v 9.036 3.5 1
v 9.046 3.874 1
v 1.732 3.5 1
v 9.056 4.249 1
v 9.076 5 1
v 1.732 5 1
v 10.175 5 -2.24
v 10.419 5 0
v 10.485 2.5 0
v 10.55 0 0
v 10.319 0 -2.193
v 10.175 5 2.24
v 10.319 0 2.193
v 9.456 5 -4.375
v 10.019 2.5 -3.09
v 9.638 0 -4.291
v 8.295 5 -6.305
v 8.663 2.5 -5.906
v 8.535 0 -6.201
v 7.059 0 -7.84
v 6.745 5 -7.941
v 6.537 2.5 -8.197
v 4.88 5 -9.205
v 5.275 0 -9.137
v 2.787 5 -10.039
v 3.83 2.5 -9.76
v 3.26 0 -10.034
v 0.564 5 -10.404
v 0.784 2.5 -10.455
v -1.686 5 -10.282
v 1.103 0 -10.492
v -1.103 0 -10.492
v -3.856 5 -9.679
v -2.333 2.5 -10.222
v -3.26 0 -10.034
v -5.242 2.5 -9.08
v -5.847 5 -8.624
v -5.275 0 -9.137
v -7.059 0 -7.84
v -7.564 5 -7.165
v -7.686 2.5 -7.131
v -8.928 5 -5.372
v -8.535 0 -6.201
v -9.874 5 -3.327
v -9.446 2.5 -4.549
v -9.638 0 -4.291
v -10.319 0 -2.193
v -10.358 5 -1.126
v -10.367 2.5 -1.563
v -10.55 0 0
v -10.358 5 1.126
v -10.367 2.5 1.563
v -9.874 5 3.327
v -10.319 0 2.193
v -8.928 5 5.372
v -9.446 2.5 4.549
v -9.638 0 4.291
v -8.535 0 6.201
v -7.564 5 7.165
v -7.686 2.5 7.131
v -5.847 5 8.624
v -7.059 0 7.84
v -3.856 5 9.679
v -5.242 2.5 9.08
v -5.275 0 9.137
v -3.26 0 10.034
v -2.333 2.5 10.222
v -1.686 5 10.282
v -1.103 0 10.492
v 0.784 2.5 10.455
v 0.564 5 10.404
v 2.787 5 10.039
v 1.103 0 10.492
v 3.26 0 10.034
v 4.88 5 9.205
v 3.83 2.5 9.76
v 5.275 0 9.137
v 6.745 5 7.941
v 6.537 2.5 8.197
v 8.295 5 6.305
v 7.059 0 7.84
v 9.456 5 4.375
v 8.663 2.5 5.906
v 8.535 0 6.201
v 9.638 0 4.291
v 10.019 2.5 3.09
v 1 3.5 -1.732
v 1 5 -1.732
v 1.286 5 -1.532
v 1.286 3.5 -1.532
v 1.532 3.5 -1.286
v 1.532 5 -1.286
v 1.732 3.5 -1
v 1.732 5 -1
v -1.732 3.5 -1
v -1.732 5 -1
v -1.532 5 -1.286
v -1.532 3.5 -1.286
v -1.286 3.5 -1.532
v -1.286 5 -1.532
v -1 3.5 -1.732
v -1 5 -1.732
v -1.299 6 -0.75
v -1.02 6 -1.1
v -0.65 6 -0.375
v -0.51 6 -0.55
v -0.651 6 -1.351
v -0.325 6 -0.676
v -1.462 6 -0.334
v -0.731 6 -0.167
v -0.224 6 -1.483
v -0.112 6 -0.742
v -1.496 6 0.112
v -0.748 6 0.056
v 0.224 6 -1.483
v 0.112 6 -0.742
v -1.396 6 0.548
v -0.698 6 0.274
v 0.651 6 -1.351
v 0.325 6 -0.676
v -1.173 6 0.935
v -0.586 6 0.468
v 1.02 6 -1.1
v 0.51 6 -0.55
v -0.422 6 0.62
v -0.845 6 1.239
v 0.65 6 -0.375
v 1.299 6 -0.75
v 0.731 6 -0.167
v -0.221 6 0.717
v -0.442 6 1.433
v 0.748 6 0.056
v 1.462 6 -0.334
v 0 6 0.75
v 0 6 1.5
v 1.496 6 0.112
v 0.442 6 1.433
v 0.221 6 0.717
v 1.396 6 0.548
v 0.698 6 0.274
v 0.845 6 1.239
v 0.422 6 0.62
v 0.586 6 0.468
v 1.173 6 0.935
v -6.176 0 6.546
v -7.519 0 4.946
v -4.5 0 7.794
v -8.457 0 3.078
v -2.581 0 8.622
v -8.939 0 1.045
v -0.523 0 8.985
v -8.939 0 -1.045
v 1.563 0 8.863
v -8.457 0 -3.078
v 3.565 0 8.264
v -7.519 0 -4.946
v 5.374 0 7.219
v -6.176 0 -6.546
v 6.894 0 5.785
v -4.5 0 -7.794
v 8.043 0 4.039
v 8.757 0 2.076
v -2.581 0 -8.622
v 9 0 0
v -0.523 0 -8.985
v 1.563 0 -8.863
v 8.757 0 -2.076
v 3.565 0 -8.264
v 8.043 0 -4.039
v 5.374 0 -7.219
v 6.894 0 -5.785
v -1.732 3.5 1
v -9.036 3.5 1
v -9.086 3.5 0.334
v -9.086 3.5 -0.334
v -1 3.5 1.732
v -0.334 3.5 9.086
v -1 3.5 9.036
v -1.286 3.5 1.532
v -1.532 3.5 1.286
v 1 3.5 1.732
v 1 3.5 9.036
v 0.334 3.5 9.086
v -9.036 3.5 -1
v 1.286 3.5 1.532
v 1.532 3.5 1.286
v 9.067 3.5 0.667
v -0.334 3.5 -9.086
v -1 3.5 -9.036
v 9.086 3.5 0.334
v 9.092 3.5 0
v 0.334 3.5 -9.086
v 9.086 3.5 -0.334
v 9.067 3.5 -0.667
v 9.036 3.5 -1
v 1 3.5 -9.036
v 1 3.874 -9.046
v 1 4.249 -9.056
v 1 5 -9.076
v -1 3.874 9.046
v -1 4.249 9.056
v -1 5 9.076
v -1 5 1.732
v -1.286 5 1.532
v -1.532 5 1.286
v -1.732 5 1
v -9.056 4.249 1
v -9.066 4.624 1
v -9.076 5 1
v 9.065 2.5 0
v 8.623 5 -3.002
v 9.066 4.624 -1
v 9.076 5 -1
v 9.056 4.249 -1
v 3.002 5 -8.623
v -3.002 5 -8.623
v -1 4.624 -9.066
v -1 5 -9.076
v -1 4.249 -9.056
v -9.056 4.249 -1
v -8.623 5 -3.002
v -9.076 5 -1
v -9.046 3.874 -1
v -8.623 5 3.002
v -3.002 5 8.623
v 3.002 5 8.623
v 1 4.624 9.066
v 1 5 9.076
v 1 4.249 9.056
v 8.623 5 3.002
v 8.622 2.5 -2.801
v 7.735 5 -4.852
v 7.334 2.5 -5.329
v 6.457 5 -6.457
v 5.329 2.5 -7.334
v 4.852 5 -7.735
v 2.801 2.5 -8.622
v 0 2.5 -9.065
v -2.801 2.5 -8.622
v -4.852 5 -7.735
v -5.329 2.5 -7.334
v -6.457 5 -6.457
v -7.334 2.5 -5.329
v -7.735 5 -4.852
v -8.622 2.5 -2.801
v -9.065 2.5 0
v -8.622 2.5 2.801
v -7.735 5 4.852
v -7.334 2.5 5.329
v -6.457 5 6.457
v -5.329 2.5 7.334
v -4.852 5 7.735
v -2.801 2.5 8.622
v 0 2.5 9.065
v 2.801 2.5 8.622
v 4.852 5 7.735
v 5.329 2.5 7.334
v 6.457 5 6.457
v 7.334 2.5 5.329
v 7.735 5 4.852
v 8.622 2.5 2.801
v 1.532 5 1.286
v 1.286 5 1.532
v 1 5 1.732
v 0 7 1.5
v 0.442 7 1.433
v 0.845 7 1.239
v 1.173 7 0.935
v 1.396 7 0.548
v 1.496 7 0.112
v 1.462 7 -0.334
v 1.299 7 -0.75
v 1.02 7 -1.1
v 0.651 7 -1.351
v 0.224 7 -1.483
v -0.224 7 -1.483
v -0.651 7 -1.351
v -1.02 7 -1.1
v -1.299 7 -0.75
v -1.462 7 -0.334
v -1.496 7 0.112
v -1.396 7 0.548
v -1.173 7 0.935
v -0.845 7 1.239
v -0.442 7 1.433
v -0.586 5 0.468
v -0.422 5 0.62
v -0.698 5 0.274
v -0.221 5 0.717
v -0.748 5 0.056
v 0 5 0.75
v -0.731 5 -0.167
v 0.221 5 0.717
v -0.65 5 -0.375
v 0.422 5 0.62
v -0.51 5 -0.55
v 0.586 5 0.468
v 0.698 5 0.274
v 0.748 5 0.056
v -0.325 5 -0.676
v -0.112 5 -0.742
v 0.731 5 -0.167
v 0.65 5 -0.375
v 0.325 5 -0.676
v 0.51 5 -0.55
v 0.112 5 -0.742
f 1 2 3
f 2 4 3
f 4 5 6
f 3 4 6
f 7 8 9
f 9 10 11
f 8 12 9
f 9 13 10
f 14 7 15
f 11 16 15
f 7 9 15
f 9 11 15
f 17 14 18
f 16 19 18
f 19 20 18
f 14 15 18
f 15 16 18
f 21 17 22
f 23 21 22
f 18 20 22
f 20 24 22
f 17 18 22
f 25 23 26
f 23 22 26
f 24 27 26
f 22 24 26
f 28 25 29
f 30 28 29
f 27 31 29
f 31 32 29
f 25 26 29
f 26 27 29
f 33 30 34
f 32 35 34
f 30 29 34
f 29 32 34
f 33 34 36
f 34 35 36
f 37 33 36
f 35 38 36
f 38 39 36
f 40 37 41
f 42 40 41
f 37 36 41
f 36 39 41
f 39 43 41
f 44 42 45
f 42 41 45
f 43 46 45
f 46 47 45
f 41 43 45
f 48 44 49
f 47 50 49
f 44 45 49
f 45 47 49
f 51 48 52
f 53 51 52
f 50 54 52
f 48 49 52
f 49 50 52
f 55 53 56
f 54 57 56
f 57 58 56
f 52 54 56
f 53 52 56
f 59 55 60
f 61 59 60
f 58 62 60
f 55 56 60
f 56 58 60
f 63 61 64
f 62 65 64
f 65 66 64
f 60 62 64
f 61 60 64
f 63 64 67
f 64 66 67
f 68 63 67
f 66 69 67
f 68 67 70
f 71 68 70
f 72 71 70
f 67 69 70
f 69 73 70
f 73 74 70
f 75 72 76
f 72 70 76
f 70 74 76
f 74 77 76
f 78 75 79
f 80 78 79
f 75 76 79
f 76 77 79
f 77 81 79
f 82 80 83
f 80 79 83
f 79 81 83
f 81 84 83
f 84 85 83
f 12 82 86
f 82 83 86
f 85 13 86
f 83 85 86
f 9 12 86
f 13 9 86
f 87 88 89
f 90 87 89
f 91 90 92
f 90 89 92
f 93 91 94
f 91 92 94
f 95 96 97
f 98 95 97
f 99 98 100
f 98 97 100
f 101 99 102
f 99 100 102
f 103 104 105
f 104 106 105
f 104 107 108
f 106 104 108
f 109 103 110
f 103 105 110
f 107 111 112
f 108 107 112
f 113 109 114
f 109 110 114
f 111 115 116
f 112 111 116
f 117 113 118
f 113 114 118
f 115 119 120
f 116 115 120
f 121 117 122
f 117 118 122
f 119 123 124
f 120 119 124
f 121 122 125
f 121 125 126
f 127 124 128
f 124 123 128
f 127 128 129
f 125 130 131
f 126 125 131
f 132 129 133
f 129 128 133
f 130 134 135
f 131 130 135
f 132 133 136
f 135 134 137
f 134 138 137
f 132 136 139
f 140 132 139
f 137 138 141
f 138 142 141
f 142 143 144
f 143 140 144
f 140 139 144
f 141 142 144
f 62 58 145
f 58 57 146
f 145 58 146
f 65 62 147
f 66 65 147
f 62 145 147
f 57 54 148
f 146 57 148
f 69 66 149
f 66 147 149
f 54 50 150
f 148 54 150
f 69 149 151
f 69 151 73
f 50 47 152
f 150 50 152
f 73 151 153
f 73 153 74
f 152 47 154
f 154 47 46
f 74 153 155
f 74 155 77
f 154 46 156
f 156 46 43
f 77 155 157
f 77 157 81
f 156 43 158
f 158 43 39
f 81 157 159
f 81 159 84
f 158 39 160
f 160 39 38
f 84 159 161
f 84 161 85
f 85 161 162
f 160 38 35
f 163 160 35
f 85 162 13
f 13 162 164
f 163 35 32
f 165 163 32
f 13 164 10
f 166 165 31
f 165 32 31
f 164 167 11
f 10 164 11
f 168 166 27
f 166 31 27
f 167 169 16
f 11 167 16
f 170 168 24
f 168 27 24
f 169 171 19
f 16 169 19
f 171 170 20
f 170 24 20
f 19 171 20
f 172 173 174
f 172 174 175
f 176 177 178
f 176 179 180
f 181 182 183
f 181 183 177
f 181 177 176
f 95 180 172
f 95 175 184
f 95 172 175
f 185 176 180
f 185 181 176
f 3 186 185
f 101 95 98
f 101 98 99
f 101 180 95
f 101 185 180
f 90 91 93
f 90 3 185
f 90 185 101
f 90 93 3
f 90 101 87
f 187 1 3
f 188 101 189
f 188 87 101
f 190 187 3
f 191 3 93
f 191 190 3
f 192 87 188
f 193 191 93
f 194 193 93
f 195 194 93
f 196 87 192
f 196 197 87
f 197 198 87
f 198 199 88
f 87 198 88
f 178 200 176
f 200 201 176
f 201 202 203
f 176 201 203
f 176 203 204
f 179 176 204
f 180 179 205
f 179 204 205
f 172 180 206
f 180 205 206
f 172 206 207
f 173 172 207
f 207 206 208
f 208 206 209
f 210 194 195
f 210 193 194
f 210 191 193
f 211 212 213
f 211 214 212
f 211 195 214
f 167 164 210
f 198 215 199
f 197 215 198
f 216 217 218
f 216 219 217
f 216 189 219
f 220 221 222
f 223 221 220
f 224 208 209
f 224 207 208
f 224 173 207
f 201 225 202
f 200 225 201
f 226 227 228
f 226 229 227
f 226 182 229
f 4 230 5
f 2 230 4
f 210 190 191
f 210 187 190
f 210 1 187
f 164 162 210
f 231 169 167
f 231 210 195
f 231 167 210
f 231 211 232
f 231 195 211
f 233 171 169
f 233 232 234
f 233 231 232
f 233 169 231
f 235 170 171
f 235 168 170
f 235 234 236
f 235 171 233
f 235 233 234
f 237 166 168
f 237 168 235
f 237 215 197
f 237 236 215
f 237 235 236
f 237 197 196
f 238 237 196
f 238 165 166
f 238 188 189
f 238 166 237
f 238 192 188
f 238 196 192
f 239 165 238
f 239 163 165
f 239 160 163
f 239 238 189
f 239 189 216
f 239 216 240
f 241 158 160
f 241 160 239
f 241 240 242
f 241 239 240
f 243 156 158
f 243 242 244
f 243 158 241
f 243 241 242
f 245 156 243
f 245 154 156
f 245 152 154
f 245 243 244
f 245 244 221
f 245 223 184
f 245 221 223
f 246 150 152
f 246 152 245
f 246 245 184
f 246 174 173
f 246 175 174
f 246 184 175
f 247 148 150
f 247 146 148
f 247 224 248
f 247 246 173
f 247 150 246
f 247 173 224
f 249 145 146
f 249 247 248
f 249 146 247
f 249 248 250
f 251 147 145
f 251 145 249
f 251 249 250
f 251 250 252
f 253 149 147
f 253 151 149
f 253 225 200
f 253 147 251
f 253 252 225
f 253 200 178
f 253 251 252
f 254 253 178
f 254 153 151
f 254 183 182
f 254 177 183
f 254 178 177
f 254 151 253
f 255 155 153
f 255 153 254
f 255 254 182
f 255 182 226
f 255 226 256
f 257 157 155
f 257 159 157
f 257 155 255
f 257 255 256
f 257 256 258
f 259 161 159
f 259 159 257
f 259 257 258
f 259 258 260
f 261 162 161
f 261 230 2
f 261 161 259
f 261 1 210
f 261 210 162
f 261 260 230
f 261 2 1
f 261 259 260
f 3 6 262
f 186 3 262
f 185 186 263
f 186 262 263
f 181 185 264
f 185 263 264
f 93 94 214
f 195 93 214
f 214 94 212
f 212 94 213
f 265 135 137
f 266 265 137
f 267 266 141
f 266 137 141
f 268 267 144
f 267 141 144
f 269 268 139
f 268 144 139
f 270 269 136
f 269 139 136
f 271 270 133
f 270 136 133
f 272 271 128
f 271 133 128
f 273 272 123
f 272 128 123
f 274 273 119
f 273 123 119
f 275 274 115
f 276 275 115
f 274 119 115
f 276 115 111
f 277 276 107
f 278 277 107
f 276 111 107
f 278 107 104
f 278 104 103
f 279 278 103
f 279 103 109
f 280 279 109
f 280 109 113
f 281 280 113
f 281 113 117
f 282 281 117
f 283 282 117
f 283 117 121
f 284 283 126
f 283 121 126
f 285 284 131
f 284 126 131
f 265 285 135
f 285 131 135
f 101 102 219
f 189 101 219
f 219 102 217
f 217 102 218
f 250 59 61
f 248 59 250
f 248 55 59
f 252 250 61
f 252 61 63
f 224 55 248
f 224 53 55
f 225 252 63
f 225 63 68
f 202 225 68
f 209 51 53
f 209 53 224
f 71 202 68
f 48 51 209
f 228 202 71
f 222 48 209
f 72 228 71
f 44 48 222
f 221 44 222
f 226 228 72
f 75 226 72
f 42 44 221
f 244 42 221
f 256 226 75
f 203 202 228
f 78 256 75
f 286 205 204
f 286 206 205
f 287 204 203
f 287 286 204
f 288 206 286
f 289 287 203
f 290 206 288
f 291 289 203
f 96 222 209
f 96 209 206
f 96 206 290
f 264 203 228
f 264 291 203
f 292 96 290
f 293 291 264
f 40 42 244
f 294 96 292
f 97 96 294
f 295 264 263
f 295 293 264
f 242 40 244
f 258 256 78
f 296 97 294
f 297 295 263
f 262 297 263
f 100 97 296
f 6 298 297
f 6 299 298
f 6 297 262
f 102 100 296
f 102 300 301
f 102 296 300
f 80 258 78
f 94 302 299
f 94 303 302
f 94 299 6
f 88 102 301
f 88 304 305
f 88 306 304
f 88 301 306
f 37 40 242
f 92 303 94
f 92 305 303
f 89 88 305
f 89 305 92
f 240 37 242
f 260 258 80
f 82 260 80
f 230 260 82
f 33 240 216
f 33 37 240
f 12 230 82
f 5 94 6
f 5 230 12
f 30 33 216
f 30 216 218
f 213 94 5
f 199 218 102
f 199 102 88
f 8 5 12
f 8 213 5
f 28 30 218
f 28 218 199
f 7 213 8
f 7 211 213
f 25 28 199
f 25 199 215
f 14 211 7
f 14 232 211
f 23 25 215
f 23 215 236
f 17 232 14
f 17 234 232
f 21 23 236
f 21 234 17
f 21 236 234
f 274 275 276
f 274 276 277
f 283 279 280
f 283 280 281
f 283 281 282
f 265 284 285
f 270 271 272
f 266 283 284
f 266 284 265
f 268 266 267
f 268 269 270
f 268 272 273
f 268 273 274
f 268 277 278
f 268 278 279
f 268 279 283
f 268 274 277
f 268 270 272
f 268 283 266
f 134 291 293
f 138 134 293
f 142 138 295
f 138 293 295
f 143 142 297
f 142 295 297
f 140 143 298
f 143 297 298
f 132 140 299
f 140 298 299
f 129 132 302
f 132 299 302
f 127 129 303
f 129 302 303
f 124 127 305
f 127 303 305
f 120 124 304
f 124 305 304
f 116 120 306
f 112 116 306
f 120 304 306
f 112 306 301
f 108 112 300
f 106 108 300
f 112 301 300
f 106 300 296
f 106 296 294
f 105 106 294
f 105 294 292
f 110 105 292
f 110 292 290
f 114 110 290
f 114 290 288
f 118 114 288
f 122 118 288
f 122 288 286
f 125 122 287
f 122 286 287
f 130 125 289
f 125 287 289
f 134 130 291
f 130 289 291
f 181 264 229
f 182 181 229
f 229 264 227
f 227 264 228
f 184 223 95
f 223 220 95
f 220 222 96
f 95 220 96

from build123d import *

# Parameters (mm, degrees)
SKETCH1_R         = 10.55
SKETCH1_R_2       = 9
EXTRUDE1_DEPTH    = 5
EXTRUDE1_DRAFT    = 1.5
EXTRUDE3_DEPTH    = 1.5
CIRPATTERN1_COUNT = 4
SKETCH5_R         = 0.75
EXTRUDE4_DEPTH    = 1
SKETCH6_R         = 1.5
EXTRUDE5_DEPTH    = 1


with BuildPart() as part:
    # Sketch1 → Extrude1 (with draft: the straight prism first)
    with BuildSketch(Plane(origin=(0, 0, 0), x_dir=(1, 0, 0), z_dir=(0, 1, 0))):
        Circle(SKETCH1_R)
        Circle(SKETCH1_R_2, mode=Mode.SUBTRACT)
    extrude(amount=EXTRUDE1_DEPTH)
    # Extrude1: the draft: its side faces are tilted about the plane it starts from
    extrude1_sides = [part.faces().sort_by_distance(p)[0] for p in [
        (-10.55, 2.5, 0),
        (-9, 2.5, 0),
    ]]
    draft(extrude1_sides, Plane(origin=(0, 0, 0), x_dir=(1, 0, 0), z_dir=(0, 1, 0)), EXTRUDE1_DRAFT)

    # Sketch4 → Extrude3 (add)
    with BuildSketch(Plane(origin=(0, 5, 0), x_dir=(1, 0, 0), z_dir=(0, 1, 0))):
        with BuildLine():
            Line((-1, 9.5), (1, 9.5))
            Line((1, 9.5), (1, 1.732050808))
            ThreePointArc((1, 1.732050808), (0, -2), (-1, 1.732050808))
            Line((-1, 1.732050808), (-1, 9.5))
        make_face()
    extrude3 = extrude(amount=-EXTRUDE3_DEPTH)

    # CirPattern1: Extrude3 ×4 about axis
    cirpattern1_axis = Axis((0, 5.25, 0), (0, -1, 0))
    for i in range(1, CIRPATTERN1_COUNT):
        add(extrude3.rotate(cirpattern1_axis, i * 360 / CIRPATTERN1_COUNT))

    # Sketch5 → Extrude4 (add)
    with BuildSketch(Plane(origin=(0, 5, 0), x_dir=(1, 0, 0), z_dir=(0, 1, 0))):
        Circle(SKETCH5_R)
    extrude(amount=EXTRUDE4_DEPTH)

    # Sketch6 → Extrude5 (add)
    with BuildSketch(Plane(origin=(0, 6, 0), x_dir=(1, 0, 0), z_dir=(0, 1, 0))):
        Circle(SKETCH6_R)
    extrude(amount=EXTRUDE5_DEPTH)


solid = part.part
